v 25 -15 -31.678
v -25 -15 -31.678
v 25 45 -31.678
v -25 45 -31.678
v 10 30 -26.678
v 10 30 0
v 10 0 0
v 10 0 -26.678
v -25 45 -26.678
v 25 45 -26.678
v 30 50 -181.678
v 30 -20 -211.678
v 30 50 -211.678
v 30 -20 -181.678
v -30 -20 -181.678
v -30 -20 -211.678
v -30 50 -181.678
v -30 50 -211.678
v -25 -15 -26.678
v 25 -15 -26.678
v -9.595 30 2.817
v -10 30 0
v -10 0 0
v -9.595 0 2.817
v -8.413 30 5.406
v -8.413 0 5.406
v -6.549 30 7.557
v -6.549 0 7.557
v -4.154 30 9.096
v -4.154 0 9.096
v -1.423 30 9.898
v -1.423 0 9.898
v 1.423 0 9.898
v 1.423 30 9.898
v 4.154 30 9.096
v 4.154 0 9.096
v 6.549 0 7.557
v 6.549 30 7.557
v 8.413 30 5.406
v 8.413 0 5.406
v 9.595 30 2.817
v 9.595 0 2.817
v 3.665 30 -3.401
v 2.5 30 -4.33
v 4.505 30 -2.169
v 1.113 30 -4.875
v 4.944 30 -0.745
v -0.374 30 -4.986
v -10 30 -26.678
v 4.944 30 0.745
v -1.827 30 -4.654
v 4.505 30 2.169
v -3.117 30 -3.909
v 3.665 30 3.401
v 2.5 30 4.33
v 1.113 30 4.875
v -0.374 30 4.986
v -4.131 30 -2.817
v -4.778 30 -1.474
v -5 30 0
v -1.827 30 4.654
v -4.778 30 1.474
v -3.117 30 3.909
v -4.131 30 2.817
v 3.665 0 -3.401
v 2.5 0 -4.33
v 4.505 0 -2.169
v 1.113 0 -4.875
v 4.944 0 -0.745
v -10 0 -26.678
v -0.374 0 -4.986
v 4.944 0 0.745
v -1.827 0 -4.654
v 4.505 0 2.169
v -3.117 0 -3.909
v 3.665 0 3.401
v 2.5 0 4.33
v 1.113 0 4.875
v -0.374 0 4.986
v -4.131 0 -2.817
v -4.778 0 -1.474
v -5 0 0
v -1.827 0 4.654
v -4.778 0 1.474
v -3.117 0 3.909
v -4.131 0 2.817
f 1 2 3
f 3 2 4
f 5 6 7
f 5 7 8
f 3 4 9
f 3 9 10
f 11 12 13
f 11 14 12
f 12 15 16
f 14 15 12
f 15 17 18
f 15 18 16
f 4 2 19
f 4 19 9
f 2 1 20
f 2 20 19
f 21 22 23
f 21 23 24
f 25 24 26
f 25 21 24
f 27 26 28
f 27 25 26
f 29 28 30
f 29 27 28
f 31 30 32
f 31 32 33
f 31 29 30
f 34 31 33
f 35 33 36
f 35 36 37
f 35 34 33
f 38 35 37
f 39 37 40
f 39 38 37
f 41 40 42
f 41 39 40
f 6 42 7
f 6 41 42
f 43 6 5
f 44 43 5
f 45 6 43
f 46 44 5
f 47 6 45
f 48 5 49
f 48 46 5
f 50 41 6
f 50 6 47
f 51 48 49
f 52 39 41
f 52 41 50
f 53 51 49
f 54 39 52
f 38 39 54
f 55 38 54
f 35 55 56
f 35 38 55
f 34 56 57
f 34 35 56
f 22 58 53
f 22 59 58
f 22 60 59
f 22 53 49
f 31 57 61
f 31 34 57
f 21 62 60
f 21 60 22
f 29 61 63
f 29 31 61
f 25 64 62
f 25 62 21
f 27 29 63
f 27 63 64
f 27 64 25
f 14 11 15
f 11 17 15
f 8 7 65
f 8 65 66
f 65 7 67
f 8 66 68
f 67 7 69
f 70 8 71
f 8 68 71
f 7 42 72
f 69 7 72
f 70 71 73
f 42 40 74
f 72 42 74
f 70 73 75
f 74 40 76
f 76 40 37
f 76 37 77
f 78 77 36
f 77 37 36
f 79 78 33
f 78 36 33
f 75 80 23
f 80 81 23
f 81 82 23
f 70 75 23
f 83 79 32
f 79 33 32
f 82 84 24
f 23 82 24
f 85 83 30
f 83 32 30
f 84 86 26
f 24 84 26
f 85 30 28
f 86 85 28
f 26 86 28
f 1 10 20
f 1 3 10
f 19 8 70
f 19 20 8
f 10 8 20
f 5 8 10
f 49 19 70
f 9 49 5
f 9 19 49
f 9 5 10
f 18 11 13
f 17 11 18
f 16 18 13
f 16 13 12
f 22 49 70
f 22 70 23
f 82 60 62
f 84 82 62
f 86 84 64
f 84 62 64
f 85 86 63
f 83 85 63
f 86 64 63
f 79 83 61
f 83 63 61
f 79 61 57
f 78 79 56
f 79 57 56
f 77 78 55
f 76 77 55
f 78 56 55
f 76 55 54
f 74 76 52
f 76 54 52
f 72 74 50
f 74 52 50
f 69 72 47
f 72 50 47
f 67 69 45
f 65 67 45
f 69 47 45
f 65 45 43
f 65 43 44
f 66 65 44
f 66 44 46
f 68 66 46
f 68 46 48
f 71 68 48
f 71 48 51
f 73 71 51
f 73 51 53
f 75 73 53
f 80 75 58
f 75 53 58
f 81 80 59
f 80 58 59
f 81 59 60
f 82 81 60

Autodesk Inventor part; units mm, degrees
ref_plane "YZ Plane" through (0, 0, 0) normal (1, 0, 0) x (0, 1, 0)
ref_plane "XY Plane" through (0, 0, 0) normal (0, 0, 1) x (1, 0, 0)
sketch "Sketch1" plane through (0, 0, 0) normal (0, 1, 0) x (-1, 0, 0)
  line L0 (0, 0) -> (0, -200) construction
  line L1 (-10, 0) -> (-10, -200)
  line L2 (10, -200) -> (10, 0)
  arc A0 (10, 0) -> (-10, 0) centre (0, 0) ccw
  arc A1 (-10, -200) -> (10, -200) centre (0, -200) ccw
  point P0 (0, -100)
  dimension "d0" = 10
  dimension "d1" = 200
ref_plane "Work Plane1" through (0, 30, 0) normal (0, 1, 0) x (-1, 0, 0)
sketch "Sketch2" plane through (0, 30, 0) normal (0, 1, 0) x (-1, 0, 0)
  line L0 (10, -200) -> (10, 0) projected
  arc A0 (10, 0) -> (-10, 0) centre (0, 0) ccw projected
  line L1 (-10, 0) -> (-10, -200) projected
  arc A1 (-10, -200) -> (10, -200) centre (0, -200) ccw projected
  circle A2 centre (0, 0) radius 5
  line L2 (10, -30) -> (-10, -30)
  dimension "d20" = 10
  dimension "d21" = 30
ref_plane "Work Plane2" through (0, 30, -181.6778) normal (0, 0, -1) x (0, -1, 0)
sketch "Sketch4" plane through (0, 30, -181.6778) normal (0, 0, -1) x (0, -1, 0)
  line L0 (33.9, -13.0515) -> (33.9, -6.9485) construction
  line L1 (33.9, -6.9485) -> (36.2985, -4.55) construction
  line L2 (36.2985, -4.55) -> (38.2, -4.55) construction
  line L3 (38.2, -4.55) -> (38.2, -6.9) construction
  line L4 (38.2, -6.9) -> (39.1, -6.9) construction
  line L5 (39.1, -6.9) -> (39.1, -6.6) construction
  arc A0 (39.3, -6.4) -> (39.1, -6.6) centre (39.3, -6.6) ccw construction
  line L6 (39.3, -6.4) -> (40, -6.4) construction
  line L7 (40, -6.4) -> (40, 6.4) construction
  line L8 (40, 6.4) -> (39.3, 6.4) construction
  arc A1 (39.1, 6.6) -> (39.3, 6.4) centre (39.3, 6.6) ccw construction
  line L9 (39.1, 6.6) -> (39.1, 6.9) construction
  line L10 (39.1, 6.9) -> (38.2, 6.9) construction
  line L11 (38.2, 6.9) -> (38.2, 4.55) construction
  line L12 (38.2, 4.55) -> (36.2985, 4.55) construction
  line L13 (36.2985, 4.55) -> (33.9, 6.9485) construction
  line L14 (33.9, 6.9485) -> (33.9, 13.0515) construction
  line L15 (33.9, 13.0515) -> (36.2985, 15.45) construction
  line L16 (36.2985, 15.45) -> (38.2, 15.45) construction
  line L17 (38.2, 15.45) -> (38.2, 13.1) construction
  line L18 (38.2, 13.1) -> (39.1, 13.1) construction
  line L19 (39.1, 13.1) -> (39.1, 13.4) construction
  arc A2 (39.3, 13.6) -> (39.1, 13.4) centre (39.3, 13.4) ccw construction
  line L20 (39.3, 13.6) -> (40, 13.6) construction
  line L21 (40, 13.6) -> (40, 18.5) construction
  arc A3 (40, 18.5) -> (38.5, 20) centre (38.5, 18.5) ccw construction
  line L22 (38.5, 20) -> (33.6, 20) construction
  line L23 (33.6, 20) -> (33.6, 19.3) construction
  arc A4 (33.4, 19.1) -> (33.6, 19.3) centre (33.4, 19.3) ccw construction
  line L24 (33.4, 19.1) -> (33.1, 19.1) construction
  line L25 (33.1, 19.1) -> (33.1, 18.2) construction
  line L26 (33.1, 18.2) -> (35.45, 18.2) construction
  line L27 (35.45, 18.2) -> (35.45, 16.2985) construction
  line L28 (35.45, 16.2985) -> (33.0515, 13.9) construction
  line L29 (33.0515, 13.9) -> (26.9485, 13.9) construction
  line L30 (26.9485, 13.9) -> (24.55, 16.2985) construction
  line L31 (24.55, 16.2985) -> (24.55, 18.2) construction
  line L32 (24.55, 18.2) -> (26.9, 18.2) construction
  line L33 (26.9, 18.2) -> (26.9, 19.1) construction
  line L34 (26.9, 19.1) -> (26.6, 19.1) construction
  arc A5 (26.4, 19.3) -> (26.6, 19.1) centre (26.6, 19.3) ccw construction
  line L35 (26.4, 19.3) -> (26.4, 20) construction
  line L36 (26.4, 20) -> (21.5, 20) construction
  arc A6 (21.5, 20) -> (20, 18.5) centre (21.5, 18.5) ccw construction
  line L37 (20, 18.5) -> (20, 13.6) construction
  line L38 (20, 13.6) -> (20.7, 13.6) construction
  arc A7 (20.9, 13.4) -> (20.7, 13.6) centre (20.7, 13.4) ccw construction
  line L39 (20.9, 13.4) -> (20.9, 13.1) construction
  line L40 (20.9, 13.1) -> (21.8, 13.1) construction
  line L41 (21.8, 13.1) -> (21.8, 15.45) construction
  line L42 (21.8, 15.45) -> (23.7015, 15.45) construction
  line L43 (23.7015, 15.45) -> (26.0515, 13.1) construction
  line L44 (26.0515, 13.1) -> (26.0515, 6.9) construction
  line L45 (26.0515, 6.9) -> (23.7015, 4.55) construction
  line L46 (23.7015, 4.55) -> (21.8, 4.55) construction
  line L47 (21.8, 4.55) -> (21.8, 6.9) construction
  line L48 (21.8, 6.9) -> (20.9, 6.9) construction
  line L49 (20.9, 6.9) -> (20.9, 6.6) construction
  arc A8 (20.7, 6.4) -> (20.9, 6.6) centre (20.7, 6.6) ccw construction
  line L50 (20.7, 6.4) -> (20, 6.4) construction
  line L51 (20, 6.4) -> (20, -6.4) construction
  line L52 (20, -6.4) -> (20.7, -6.4) construction
  arc A9 (20.9, -6.6) -> (20.7, -6.4) centre (20.7, -6.6) ccw construction
  line L53 (20.9, -6.6) -> (20.9, -6.9) construction
  line L54 (20.9, -6.9) -> (21.8, -6.9) construction
  line L55 (21.8, -6.9) -> (21.8, -4.55) construction
  line L56 (21.8, -4.55) -> (23.7015, -4.55) construction
  line L57 (23.7015, -4.55) -> (26.0515, -6.9) construction
  line L58 (26.0515, -6.9) -> (26.0515, -13.1) construction
  line L59 (26.0515, -13.1) -> (23.7015, -15.45) construction
  line L60 (23.7015, -15.45) -> (21.8, -15.45) construction
  line L61 (21.8, -15.45) -> (21.8, -13.1) construction
  line L62 (21.8, -13.1) -> (20.9, -13.1) construction
  line L63 (20.9, -13.1) -> (20.9, -13.4) construction
  arc A10 (20.7, -13.6) -> (20.9, -13.4) centre (20.7, -13.4) ccw construction
  line L64 (20.7, -13.6) -> (20, -13.6) construction
  line L65 (20, -13.6) -> (20, -18.5) construction
  arc A11 (20, -18.5) -> (21.5, -20) centre (21.5, -18.5) ccw construction
  line L66 (21.5, -20) -> (26.4, -20) construction
  line L67 (26.4, -20) -> (26.4, -19.3) construction
  arc A12 (26.6, -19.1) -> (26.4, -19.3) centre (26.6, -19.3) ccw construction
  line L68 (26.6, -19.1) -> (26.9, -19.1) construction
  line L69 (26.9, -19.1) -> (26.9, -18.2) construction
  line L70 (26.9, -18.2) -> (24.55, -18.2) construction
  line L71 (24.55, -18.2) -> (24.55, -16.2985) construction
  line L72 (24.55, -16.2985) -> (26.9485, -13.9) construction
  line L73 (26.9485, -13.9) -> (33.0515, -13.9) construction
  line L74 (33.0515, -13.9) -> (35.45, -16.2985) construction
  line L75 (35.45, -16.2985) -> (35.45, -18.2) construction
  line L76 (35.45, -18.2) -> (33.1, -18.2) construction
  line L77 (33.1, -18.2) -> (33.1, -19.1) construction
  line L78 (33.1, -19.1) -> (33.4, -19.1) construction
  arc A13 (33.6, -19.3) -> (33.4, -19.1) centre (33.4, -19.3) ccw construction
  line L79 (33.6, -19.3) -> (33.6, -20) construction
  line L80 (33.6, -20) -> (38.5, -20) construction
  arc A14 (38.5, -20) -> (40, -18.5) centre (38.5, -18.5) ccw construction
  line L81 (40, -18.5) -> (40, -13.6) construction
  line L82 (40, -13.6) -> (39.3, -13.6) construction
  arc A15 (39.1, -13.4) -> (39.3, -13.6) centre (39.3, -13.4) ccw construction
  line L83 (39.1, -13.4) -> (39.1, -13.1) construction
  line L84 (39.1, -13.1) -> (38.2, -13.1) construction
  line L85 (38.2, -13.1) -> (38.2, -15.45) construction
  line L86 (38.2, -15.45) -> (36.2985, -15.45) construction
  line L87 (36.2985, -15.45) -> (33.9, -13.0515) construction
  circle A16 centre (30, 10) radius 2.5 construction
  circle A17 centre (30, -10) radius 2.5 construction
  line L88 (33.0515, 6.1) -> (35.8015, 3.35) construction
  line L89 (35.8015, 3.35) -> (38.2, 3.35) construction
  line L90 (38.2, 3.35) -> (38.2, -3.35) construction
  line L91 (38.2, -3.35) -> (35.8015, -3.35) construction
  line L92 (35.8015, -3.35) -> (33.0515, -6.1) construction
  line L93 (33.0515, -6.1) -> (26.9485, -6.1) construction
  line L94 (26.9485, -6.1) -> (24.1985, -3.35) construction
  line L95 (24.1985, -3.35) -> (21.8, -3.35) construction
  line L96 (21.8, -3.35) -> (21.8, 3.35) construction
  line L97 (21.8, 3.35) -> (24.1985, 3.35) construction
  line L98 (24.1985, 3.35) -> (26.9485, 6.1) construction
  line L99 (26.9485, 6.1) -> (33.0515, 6.1) construction
  line L100 (3.9, -13.0515) -> (3.9, -6.9485) construction
  line L101 (3.9, -6.9485) -> (6.2985, -4.55) construction
  line L102 (6.2985, -4.55) -> (8.2, -4.55) construction
  line L103 (8.2, -4.55) -> (8.2, -6.9) construction
  line L104 (8.2, -6.9) -> (9.1, -6.9) construction
  line L105 (9.1, -6.9) -> (9.1, -6.6) construction
  arc A18 (9.3, -6.4) -> (9.1, -6.6) centre (9.3, -6.6) ccw construction
  line L106 (9.3, -6.4) -> (10, -6.4) construction
  line L107 (10, -6.4) -> (10, 6.4) construction
  line L108 (10, 6.4) -> (9.3, 6.4) construction
  arc A19 (9.1, 6.6) -> (9.3, 6.4) centre (9.3, 6.6) ccw construction
  line L109 (9.1, 6.6) -> (9.1, 6.9) construction
  line L110 (9.1, 6.9) -> (8.2, 6.9) construction
  line L111 (8.2, 6.9) -> (8.2, 4.55) construction
  line L112 (8.2, 4.55) -> (6.2985, 4.55) construction
  line L113 (6.2985, 4.55) -> (3.9, 6.9485) construction
  line L114 (3.9, 6.9485) -> (3.9, 13.0515) construction
  line L115 (3.9, 13.0515) -> (6.2985, 15.45) construction
  line L116 (6.2985, 15.45) -> (8.2, 15.45) construction
  line L117 (8.2, 15.45) -> (8.2, 13.1) construction
  line L118 (8.2, 13.1) -> (9.1, 13.1) construction
  line L119 (9.1, 13.1) -> (9.1, 13.4) construction
  arc A20 (9.3, 13.6) -> (9.1, 13.4) centre (9.3, 13.4) ccw construction
  line L120 (9.3, 13.6) -> (10, 13.6) construction
  line L121 (10, 13.6) -> (10, 18.5) construction
  arc A21 (10, 18.5) -> (8.5, 20) centre (8.5, 18.5) ccw construction
  line L122 (8.5, 20) -> (3.6, 20) construction
  line L123 (3.6, 20) -> (3.6, 19.3) construction
  arc A22 (3.4, 19.1) -> (3.6, 19.3) centre (3.4, 19.3) ccw construction
  line L124 (3.4, 19.1) -> (3.1, 19.1) construction
  line L125 (3.1, 19.1) -> (3.1, 18.2) construction
  line L126 (3.1, 18.2) -> (5.45, 18.2) construction
  line L127 (5.45, 18.2) -> (5.45, 16.2985) construction
  line L128 (5.45, 16.2985) -> (3.0515, 13.9) construction
  line L129 (3.0515, 13.9) -> (-3.0515, 13.9) construction
  line L130 (-3.0515, 13.9) -> (-5.45, 16.2985) construction
  line L131 (-5.45, 16.2985) -> (-5.45, 18.2) construction
  line L132 (-5.45, 18.2) -> (-3.1, 18.2) construction
  line L133 (-3.1, 18.2) -> (-3.1, 19.1) construction
  line L134 (-3.1, 19.1) -> (-3.4, 19.1) construction
  arc A23 (-3.6, 19.3) -> (-3.4, 19.1) centre (-3.4, 19.3) ccw construction
  line L135 (-3.6, 19.3) -> (-3.6, 20) construction
  line L136 (-3.6, 20) -> (-8.5, 20) construction
  arc A24 (-8.5, 20) -> (-10, 18.5) centre (-8.5, 18.5) ccw construction
  line L137 (-10, 18.5) -> (-10, 13.6) construction
  line L138 (-10, 13.6) -> (-9.3, 13.6) construction
  arc A25 (-9.1, 13.4) -> (-9.3, 13.6) centre (-9.3, 13.4) ccw construction
  line L139 (-9.1, 13.4) -> (-9.1, 13.1) construction
  line L140 (-9.1, 13.1) -> (-8.2, 13.1) construction
  line L141 (-8.2, 13.1) -> (-8.2, 15.45) construction
  line L142 (-8.2, 15.45) -> (-6.2985, 15.45) construction
  line L143 (-6.2985, 15.45) -> (-3.9485, 13.1) construction
  line L144 (-3.9485, 13.1) -> (-3.9485, 6.9) construction
  line L145 (-3.9485, 6.9) -> (-6.2985, 4.55) construction
  line L146 (-6.2985, 4.55) -> (-8.2, 4.55) construction
  line L147 (-8.2, 4.55) -> (-8.2, 6.9) construction
  line L148 (-8.2, 6.9) -> (-9.1, 6.9) construction
  line L149 (-9.1, 6.9) -> (-9.1, 6.6) construction
  arc A26 (-9.3, 6.4) -> (-9.1, 6.6) centre (-9.3, 6.6) ccw construction
  line L150 (-9.3, 6.4) -> (-10, 6.4) construction
  line L151 (-10, 6.4) -> (-10, -6.4) construction
  line L152 (-10, -6.4) -> (-9.3, -6.4) construction
  arc A27 (-9.1, -6.6) -> (-9.3, -6.4) centre (-9.3, -6.6) ccw construction
  line L153 (-9.1, -6.6) -> (-9.1, -6.9) construction
  line L154 (-9.1, -6.9) -> (-8.2, -6.9) construction
  line L155 (-8.2, -6.9) -> (-8.2, -4.55) construction
  line L156 (-8.2, -4.55) -> (-6.2985, -4.55) construction
  line L157 (-6.2985, -4.55) -> (-3.9485, -6.9) construction
  line L158 (-3.9485, -6.9) -> (-3.9485, -13.1) construction
  line L159 (-3.9485, -13.1) -> (-6.2985, -15.45) construction
  line L160 (-6.2985, -15.45) -> (-8.2, -15.45) construction
  line L161 (-8.2, -15.45) -> (-8.2, -13.1) construction
  line L162 (-8.2, -13.1) -> (-9.1, -13.1) construction
  line L163 (-9.1, -13.1) -> (-9.1, -13.4) construction
  arc A28 (-9.3, -13.6) -> (-9.1, -13.4) centre (-9.3, -13.4) ccw construction
  line L164 (-9.3, -13.6) -> (-10, -13.6) construction
  line L165 (-10, -13.6) -> (-10, -18.5) construction
  arc A29 (-10, -18.5) -> (-8.5, -20) centre (-8.5, -18.5) ccw construction
  line L166 (-8.5, -20) -> (-3.6, -20) construction
  line L167 (-3.6, -20) -> (-3.6, -19.3) construction
  arc A30 (-3.4, -19.1) -> (-3.6, -19.3) centre (-3.4, -19.3) ccw construction
  line L168 (-3.4, -19.1) -> (-3.1, -19.1) construction
  line L169 (-3.1, -19.1) -> (-3.1, -18.2) construction
  line L170 (-3.1, -18.2) -> (-5.45, -18.2) construction
  line L171 (-5.45, -18.2) -> (-5.45, -16.2985) construction
  line L172 (-5.45, -16.2985) -> (-3.0515, -13.9) construction
  line L173 (-3.0515, -13.9) -> (3.0515, -13.9) construction
  line L174 (3.0515, -13.9) -> (5.45, -16.2985) construction
  line L175 (5.45, -16.2985) -> (5.45, -18.2) construction
  line L176 (5.45, -18.2) -> (3.1, -18.2) construction
  line L177 (3.1, -18.2) -> (3.1, -19.1) construction
  line L178 (3.1, -19.1) -> (3.4, -19.1) construction
  arc A31 (3.6, -19.3) -> (3.4, -19.1) centre (3.4, -19.3) ccw construction
  line L179 (3.6, -19.3) -> (3.6, -20) construction
  line L180 (3.6, -20) -> (8.5, -20) construction
  arc A32 (8.5, -20) -> (10, -18.5) centre (8.5, -18.5) ccw construction
  line L181 (10, -18.5) -> (10, -13.6) construction
  line L182 (10, -13.6) -> (9.3, -13.6) construction
  arc A33 (9.1, -13.4) -> (9.3, -13.6) centre (9.3, -13.4) ccw construction
  line L183 (9.1, -13.4) -> (9.1, -13.1) construction
  line L184 (9.1, -13.1) -> (8.2, -13.1) construction
  line L185 (8.2, -13.1) -> (8.2, -15.45) construction
  line L186 (8.2, -15.45) -> (6.2985, -15.45) construction
  line L187 (6.2985, -15.45) -> (3.9, -13.0515) construction
  circle A34 centre (0, 10) radius 2.5 construction
  circle A35 centre (0, -10) radius 2.5 construction
  line L188 (3.0515, 6.1) -> (5.8015, 3.35) construction
  line L189 (5.8015, 3.35) -> (8.2, 3.35) construction
  line L190 (8.2, 3.35) -> (8.2, -3.35) construction
  line L191 (8.2, -3.35) -> (5.8015, -3.35) construction
  line L192 (5.8015, -3.35) -> (3.0515, -6.1) construction
  line L193 (3.0515, -6.1) -> (-3.0515, -6.1) construction
  line L194 (-3.0515, -6.1) -> (-5.8015, -3.35) construction
  line L195 (-5.8015, -3.35) -> (-8.2, -3.35) construction
  line L196 (-8.2, -3.35) -> (-8.2, 3.35) construction
  line L197 (-8.2, 3.35) -> (-5.8015, 3.35) construction
  line L198 (-5.8015, 3.35) -> (-3.0515, 6.1) construction
  line L199 (-3.0515, 6.1) -> (3.0515, 6.1) construction
  line L200 (-3.6, 20) -> (33.6, 20) construction
  line L201 (40, 13.6) -> (40, -13.6) construction
  line L202 (33.6, -20) -> (-3.6, -20) construction
  line L203 (-10, -13.6) -> (-10, 13.6) construction
  line L204 (-20, 30) -> (50, 30)
  line L205 (50, 30) -> (50, -30)
  line L206 (50, -30) -> (-20, -30)
  line L207 (-20, -30) -> (-20, 30)
  point P0 (30, 0)
  dimension "d7" = 10
  dimension "d8" = 10
  dimension "d9" = 10
  dimension "d10" = 10
extrude "Extrusion2" add sketch "Sketch4" along normal blind 30
ref_plane "Work Plane3" through (0, 0, -31.6778) normal (0, 0, 1) x (0, 1, 0)
sketch "Sketch5" plane through (0, 0, -31.6778) normal (0, 0, 1) x (0, 1, 0)
  line L0 (-15, 25) -> (45, 25)
  line L1 (45, 25) -> (45, -25)
  line L2 (45, -25) -> (-15, -25)
  line L3 (-15, -25) -> (-15, 25)
  line L4 (26.1, -6.9485) -> (26.1, -13.0515) construction
  line L5 (26.1, -13.0515) -> (23.7015, -15.45) construction
  line L6 (23.7015, -15.45) -> (21.8, -15.45) construction
  line L7 (21.8, -15.45) -> (21.8, -13.1) construction
  line L8 (21.8, -13.1) -> (20.9, -13.1) construction
  line L9 (20.9, -13.1) -> (20.9, -13.4) construction
  arc A0 (20.7, -13.6) -> (20.9, -13.4) centre (20.7, -13.4) ccw construction
  line L10 (20.7, -13.6) -> (20, -13.6) construction
  line L11 (20, -13.6) -> (20, -18.5) construction
  arc A1 (20, -18.5) -> (21.5, -20) centre (21.5, -18.5) ccw construction
  line L12 (21.5, -20) -> (26.4, -20) construction
  line L13 (26.4, -20) -> (26.4, -19.3) construction
  arc A2 (26.6, -19.1) -> (26.4, -19.3) centre (26.6, -19.3) ccw construction
  line L14 (26.6, -19.1) -> (26.9, -19.1) construction
  line L15 (26.9, -19.1) -> (26.9, -18.2) construction
  line L16 (26.9, -18.2) -> (24.55, -18.2) construction
  line L17 (24.55, -18.2) -> (24.55, -16.2985) construction
  line L18 (24.55, -16.2985) -> (26.9485, -13.9) construction
  line L19 (26.9485, -13.9) -> (33.0515, -13.9) construction
  line L20 (33.0515, -13.9) -> (35.45, -16.2985) construction
  line L21 (35.45, -16.2985) -> (35.45, -18.2) construction
  line L22 (35.45, -18.2) -> (33.1, -18.2) construction
  line L23 (33.1, -18.2) -> (33.1, -19.1) construction
  line L24 (33.1, -19.1) -> (33.4, -19.1) construction
  arc A3 (33.6, -19.3) -> (33.4, -19.1) centre (33.4, -19.3) ccw construction
  line L25 (33.6, -19.3) -> (33.6, -20) construction
  line L26 (33.6, -20) -> (38.5, -20) construction
  arc A4 (38.5, -20) -> (40, -18.5) centre (38.5, -18.5) ccw construction
  line L27 (40, -18.5) -> (40, -13.6) construction
  line L28 (40, -13.6) -> (39.3, -13.6) construction
  arc A5 (39.1, -13.4) -> (39.3, -13.6) centre (39.3, -13.4) ccw construction
  line L29 (39.1, -13.4) -> (39.1, -13.1) construction
  line L30 (39.1, -13.1) -> (38.2, -13.1) construction
  line L31 (38.2, -13.1) -> (38.2, -15.45) construction
  line L32 (38.2, -15.45) -> (36.2985, -15.45) construction
  line L33 (36.2985, -15.45) -> (33.9485, -13.1) construction
  line L34 (33.9485, -13.1) -> (33.9485, -6.9) construction
  line L35 (33.9485, -6.9) -> (36.2985, -4.55) construction
  line L36 (36.2985, -4.55) -> (38.2, -4.55) construction
  line L37 (38.2, -4.55) -> (38.2, -6.9) construction
  line L38 (38.2, -6.9) -> (39.1, -6.9) construction
  line L39 (39.1, -6.9) -> (39.1, -6.6) construction
  arc A6 (39.3, -6.4) -> (39.1, -6.6) centre (39.3, -6.6) ccw construction
  line L40 (39.3, -6.4) -> (40, -6.4) construction
  line L41 (40, -6.4) -> (40, 6.4) construction
  line L42 (40, 6.4) -> (39.3, 6.4) construction
  arc A7 (39.1, 6.6) -> (39.3, 6.4) centre (39.3, 6.6) ccw construction
  line L43 (39.1, 6.6) -> (39.1, 6.9) construction
  line L44 (39.1, 6.9) -> (38.2, 6.9) construction
  line L45 (38.2, 6.9) -> (38.2, 4.55) construction
  line L46 (38.2, 4.55) -> (36.2985, 4.55) construction
  line L47 (36.2985, 4.55) -> (33.9485, 6.9) construction
  line L48 (33.9485, 6.9) -> (33.9485, 13.1) construction
  line L49 (33.9485, 13.1) -> (36.2985, 15.45) construction
  line L50 (36.2985, 15.45) -> (38.2, 15.45) construction
  line L51 (38.2, 15.45) -> (38.2, 13.1) construction
  line L52 (38.2, 13.1) -> (39.1, 13.1) construction
  line L53 (39.1, 13.1) -> (39.1, 13.4) construction
  arc A8 (39.3, 13.6) -> (39.1, 13.4) centre (39.3, 13.4) ccw construction
  line L54 (39.3, 13.6) -> (40, 13.6) construction
  line L55 (40, 13.6) -> (40, 18.5) construction
  arc A9 (40, 18.5) -> (38.5, 20) centre (38.5, 18.5) ccw construction
  line L56 (38.5, 20) -> (33.6, 20) construction
  line L57 (33.6, 20) -> (33.6, 19.3) construction
  arc A10 (33.4, 19.1) -> (33.6, 19.3) centre (33.4, 19.3) ccw construction
  line L58 (33.4, 19.1) -> (33.1, 19.1) construction
  line L59 (33.1, 19.1) -> (33.1, 18.2) construction
  line L60 (33.1, 18.2) -> (35.45, 18.2) construction
  line L61 (35.45, 18.2) -> (35.45, 16.2985) construction
  line L62 (35.45, 16.2985) -> (33.0515, 13.9) construction
  line L63 (33.0515, 13.9) -> (26.9485, 13.9) construction
  line L64 (26.9485, 13.9) -> (24.55, 16.2985) construction
  line L65 (24.55, 16.2985) -> (24.55, 18.2) construction
  line L66 (24.55, 18.2) -> (26.9, 18.2) construction
  line L67 (26.9, 18.2) -> (26.9, 19.1) construction
  line L68 (26.9, 19.1) -> (26.6, 19.1) construction
  arc A11 (26.4, 19.3) -> (26.6, 19.1) centre (26.6, 19.3) ccw construction
  line L69 (26.4, 19.3) -> (26.4, 20) construction
  line L70 (26.4, 20) -> (21.5, 20) construction
  arc A12 (21.5, 20) -> (20, 18.5) centre (21.5, 18.5) ccw construction
  line L71 (20, 18.5) -> (20, 13.6) construction
  line L72 (20, 13.6) -> (20.7, 13.6) construction
  arc A13 (20.9, 13.4) -> (20.7, 13.6) centre (20.7, 13.4) ccw construction
  line L73 (20.9, 13.4) -> (20.9, 13.1) construction
  line L74 (20.9, 13.1) -> (21.8, 13.1) construction
  line L75 (21.8, 13.1) -> (21.8, 15.45) construction
  line L76 (21.8, 15.45) -> (23.7015, 15.45) construction
  line L77 (23.7015, 15.45) -> (26.1, 13.0515) construction
  line L78 (26.1, 13.0515) -> (26.1, 6.9485) construction
  line L79 (26.1, 6.9485) -> (23.7015, 4.55) construction
  line L80 (23.7015, 4.55) -> (21.8, 4.55) construction
  line L81 (21.8, 4.55) -> (21.8, 6.9) construction
  line L82 (21.8, 6.9) -> (20.9, 6.9) construction
  line L83 (20.9, 6.9) -> (20.9, 6.6) construction
  arc A14 (20.7, 6.4) -> (20.9, 6.6) centre (20.7, 6.6) ccw construction
  line L84 (20.7, 6.4) -> (20, 6.4) construction
  line L85 (20, 6.4) -> (20, -6.4) construction
  line L86 (20, -6.4) -> (20.7, -6.4) construction
  arc A15 (20.9, -6.6) -> (20.7, -6.4) centre (20.7, -6.6) ccw construction
  line L87 (20.9, -6.6) -> (20.9, -6.9) construction
  line L88 (20.9, -6.9) -> (21.8, -6.9) construction
  line L89 (21.8, -6.9) -> (21.8, -4.55) construction
  line L90 (21.8, -4.55) -> (23.7015, -4.55) construction
  line L91 (23.7015, -4.55) -> (26.1, -6.9485) construction
  circle A16 centre (30, 10) radius 2.5 construction
  circle A17 centre (30, -10) radius 2.5 construction
  line L92 (24.1985, 3.35) -> (26.9485, 6.1) construction
  line L93 (26.9485, 6.1) -> (33.0515, 6.1) construction
  line L94 (33.0515, 6.1) -> (35.8015, 3.35) construction
  line L95 (35.8015, 3.35) -> (38.2, 3.35) construction
  line L96 (38.2, 3.35) -> (38.2, -3.35) construction
  line L97 (38.2, -3.35) -> (35.8015, -3.35) construction
  line L98 (35.8015, -3.35) -> (33.0515, -6.1) construction
  line L99 (33.0515, -6.1) -> (26.9485, -6.1) construction
  line L100 (26.9485, -6.1) -> (24.1985, -3.35) construction
  line L101 (24.1985, -3.35) -> (21.8, -3.35) construction
  line L102 (21.8, -3.35) -> (21.8, 3.35) construction
  line L103 (21.8, 3.35) -> (24.1985, 3.35) construction
  line L104 (-3.9, -6.9485) -> (-3.9, -13.0515) construction
  line L105 (-3.9, -13.0515) -> (-6.2985, -15.45) construction
  line L106 (-6.2985, -15.45) -> (-8.2, -15.45) construction
  line L107 (-8.2, -15.45) -> (-8.2, -13.1) construction
  line L108 (-8.2, -13.1) -> (-9.1, -13.1) construction
  line L109 (-9.1, -13.1) -> (-9.1, -13.4) construction
  arc A18 (-9.3, -13.6) -> (-9.1, -13.4) centre (-9.3, -13.4) ccw construction
  line L110 (-9.3, -13.6) -> (-10, -13.6) construction
  line L111 (-10, -13.6) -> (-10, -18.5) construction
  arc A19 (-10, -18.5) -> (-8.5, -20) centre (-8.5, -18.5) ccw construction
  line L112 (-8.5, -20) -> (-3.6, -20) construction
  line L113 (-3.6, -20) -> (-3.6, -19.3) construction
  arc A20 (-3.4, -19.1) -> (-3.6, -19.3) centre (-3.4, -19.3) ccw construction
  line L114 (-3.4, -19.1) -> (-3.1, -19.1) construction
  line L115 (-3.1, -19.1) -> (-3.1, -18.2) construction
  line L116 (-3.1, -18.2) -> (-5.45, -18.2) construction
  line L117 (-5.45, -18.2) -> (-5.45, -16.2985) construction
  line L118 (-5.45, -16.2985) -> (-3.0515, -13.9) construction
  line L119 (-3.0515, -13.9) -> (3.0515, -13.9) construction
  line L120 (3.0515, -13.9) -> (5.45, -16.2985) construction
  line L121 (5.45, -16.2985) -> (5.45, -18.2) construction
  line L122 (5.45, -18.2) -> (3.1, -18.2) construction
  line L123 (3.1, -18.2) -> (3.1, -19.1) construction
  line L124 (3.1, -19.1) -> (3.4, -19.1) construction
  arc A21 (3.6, -19.3) -> (3.4, -19.1) centre (3.4, -19.3) ccw construction
  line L125 (3.6, -19.3) -> (3.6, -20) construction
  line L126 (3.6, -20) -> (8.5, -20) construction
  arc A22 (8.5, -20) -> (10, -18.5) centre (8.5, -18.5) ccw construction
  line L127 (10, -18.5) -> (10, -13.6) construction
  line L128 (10, -13.6) -> (9.3, -13.6) construction
  arc A23 (9.1, -13.4) -> (9.3, -13.6) centre (9.3, -13.4) ccw construction
  line L129 (9.1, -13.4) -> (9.1, -13.1) construction
  line L130 (9.1, -13.1) -> (8.2, -13.1) construction
  line L131 (8.2, -13.1) -> (8.2, -15.45) construction
  line L132 (8.2, -15.45) -> (6.2985, -15.45) construction
  line L133 (6.2985, -15.45) -> (3.9485, -13.1) construction
  line L134 (3.9485, -13.1) -> (3.9485, -6.9) construction
  line L135 (3.9485, -6.9) -> (6.2985, -4.55) construction
  line L136 (6.2985, -4.55) -> (8.2, -4.55) construction
  line L137 (8.2, -4.55) -> (8.2, -6.9) construction
  line L138 (8.2, -6.9) -> (9.1, -6.9) construction
  line L139 (9.1, -6.9) -> (9.1, -6.6) construction
  arc A24 (9.3, -6.4) -> (9.1, -6.6) centre (9.3, -6.6) ccw construction
  line L140 (9.3, -6.4) -> (10, -6.4) construction
  line L141 (10, -6.4) -> (10, 6.4) construction
  line L142 (10, 6.4) -> (9.3, 6.4) construction
  arc A25 (9.1, 6.6) -> (9.3, 6.4) centre (9.3, 6.6) ccw construction
  line L143 (9.1, 6.6) -> (9.1, 6.9) construction
  line L144 (9.1, 6.9) -> (8.2, 6.9) construction
  line L145 (8.2, 6.9) -> (8.2, 4.55) construction
  line L146 (8.2, 4.55) -> (6.2985, 4.55) construction
  line L147 (6.2985, 4.55) -> (3.9485, 6.9) construction
  line L148 (3.9485, 6.9) -> (3.9485, 13.1) construction
  line L149 (3.9485, 13.1) -> (6.2985, 15.45) construction
  line L150 (6.2985, 15.45) -> (8.2, 15.45) construction
  line L151 (8.2, 15.45) -> (8.2, 13.1) construction
  line L152 (8.2, 13.1) -> (9.1, 13.1) construction
  line L153 (9.1, 13.1) -> (9.1, 13.4) construction
  arc A26 (9.3, 13.6) -> (9.1, 13.4) centre (9.3, 13.4) ccw construction
  line L154 (9.3, 13.6) -> (10, 13.6) construction
  line L155 (10, 13.6) -> (10, 18.5) construction
  arc A27 (10, 18.5) -> (8.5, 20) centre (8.5, 18.5) ccw construction
  line L156 (8.5, 20) -> (3.6, 20) construction
  line L157 (3.6, 20) -> (3.6, 19.3) construction
  arc A28 (3.4, 19.1) -> (3.6, 19.3) centre (3.4, 19.3) ccw construction
  line L158 (3.4, 19.1) -> (3.1, 19.1) construction
  line L159 (3.1, 19.1) -> (3.1, 18.2) construction
  line L160 (3.1, 18.2) -> (5.45, 18.2) construction
  line L161 (5.45, 18.2) -> (5.45, 16.2985) construction
  line L162 (5.45, 16.2985) -> (3.0515, 13.9) construction
  line L163 (3.0515, 13.9) -> (-3.0515, 13.9) construction
  line L164 (-3.0515, 13.9) -> (-5.45, 16.2985) construction
  line L165 (-5.45, 16.2985) -> (-5.45, 18.2) construction
  line L166 (-5.45, 18.2) -> (-3.1, 18.2) construction
  line L167 (-3.1, 18.2) -> (-3.1, 19.1) construction
  line L168 (-3.1, 19.1) -> (-3.4, 19.1) construction
  arc A29 (-3.6, 19.3) -> (-3.4, 19.1) centre (-3.4, 19.3) ccw construction
  line L169 (-3.6, 19.3) -> (-3.6, 20) construction
  line L170 (-3.6, 20) -> (-8.5, 20) construction
  arc A30 (-8.5, 20) -> (-10, 18.5) centre (-8.5, 18.5) ccw construction
  line L171 (-10, 18.5) -> (-10, 13.6) construction
  line L172 (-10, 13.6) -> (-9.3, 13.6) construction
  arc A31 (-9.1, 13.4) -> (-9.3, 13.6) centre (-9.3, 13.4) ccw construction
  line L173 (-9.1, 13.4) -> (-9.1, 13.1) construction
  line L174 (-9.1, 13.1) -> (-8.2, 13.1) construction
  line L175 (-8.2, 13.1) -> (-8.2, 15.45) construction
  line L176 (-8.2, 15.45) -> (-6.2985, 15.45) construction
  line L177 (-6.2985, 15.45) -> (-3.9, 13.0515) construction
  line L178 (-3.9, 13.0515) -> (-3.9, 6.9485) construction
  line L179 (-3.9, 6.9485) -> (-6.2985, 4.55) construction
  line L180 (-6.2985, 4.55) -> (-8.2, 4.55) construction
  line L181 (-8.2, 4.55) -> (-8.2, 6.9) construction
  line L182 (-8.2, 6.9) -> (-9.1, 6.9) construction
  line L183 (-9.1, 6.9) -> (-9.1, 6.6) construction
  arc A32 (-9.3, 6.4) -> (-9.1, 6.6) centre (-9.3, 6.6) ccw construction
  line L184 (-9.3, 6.4) -> (-10, 6.4) construction
  line L185 (-10, 6.4) -> (-10, -6.4) construction
  line L186 (-10, -6.4) -> (-9.3, -6.4) construction
  arc A33 (-9.1, -6.6) -> (-9.3, -6.4) centre (-9.3, -6.6) ccw construction
  line L187 (-9.1, -6.6) -> (-9.1, -6.9) construction
  line L188 (-9.1, -6.9) -> (-8.2, -6.9) construction
  line L189 (-8.2, -6.9) -> (-8.2, -4.55) construction
  line L190 (-8.2, -4.55) -> (-6.2985, -4.55) construction
  line L191 (-6.2985, -4.55) -> (-3.9, -6.9485) construction
  circle A34 centre (0, 10) radius 2.5 construction
  circle A35 centre (0, -10) radius 2.5 construction
  line L192 (-5.8015, 3.35) -> (-3.0515, 6.1) construction
  line L193 (-3.0515, 6.1) -> (3.0515, 6.1) construction
  line L194 (3.0515, 6.1) -> (5.8015, 3.35) construction
  line L195 (5.8015, 3.35) -> (8.2, 3.35) construction
  line L196 (8.2, 3.35) -> (8.2, -3.35) construction
  line L197 (8.2, -3.35) -> (5.8015, -3.35) construction
  line L198 (5.8015, -3.35) -> (3.0515, -6.1) construction
  line L199 (3.0515, -6.1) -> (-3.0515, -6.1) construction
  line L200 (-3.0515, -6.1) -> (-5.8015, -3.35) construction
  line L201 (-5.8015, -3.35) -> (-8.2, -3.35) construction
  line L202 (-8.2, -3.35) -> (-8.2, 3.35) construction
  line L203 (-8.2, 3.35) -> (-5.8015, 3.35) construction
  point P0 (0, 0)
  dimension "d13" = 5
  dimension "d15" = 5
  dimension "d16" = 5
  dimension "d17" = 5
extrude "Extrusion3" add sketch "Sketch5" along normal blind 5
extrude "Extrusion4" add sketch "Sketch2" against normal blind 30 contours L2 L1 A0 L0
properties part number "j4 for end effector" material "Aluminum 6061"
